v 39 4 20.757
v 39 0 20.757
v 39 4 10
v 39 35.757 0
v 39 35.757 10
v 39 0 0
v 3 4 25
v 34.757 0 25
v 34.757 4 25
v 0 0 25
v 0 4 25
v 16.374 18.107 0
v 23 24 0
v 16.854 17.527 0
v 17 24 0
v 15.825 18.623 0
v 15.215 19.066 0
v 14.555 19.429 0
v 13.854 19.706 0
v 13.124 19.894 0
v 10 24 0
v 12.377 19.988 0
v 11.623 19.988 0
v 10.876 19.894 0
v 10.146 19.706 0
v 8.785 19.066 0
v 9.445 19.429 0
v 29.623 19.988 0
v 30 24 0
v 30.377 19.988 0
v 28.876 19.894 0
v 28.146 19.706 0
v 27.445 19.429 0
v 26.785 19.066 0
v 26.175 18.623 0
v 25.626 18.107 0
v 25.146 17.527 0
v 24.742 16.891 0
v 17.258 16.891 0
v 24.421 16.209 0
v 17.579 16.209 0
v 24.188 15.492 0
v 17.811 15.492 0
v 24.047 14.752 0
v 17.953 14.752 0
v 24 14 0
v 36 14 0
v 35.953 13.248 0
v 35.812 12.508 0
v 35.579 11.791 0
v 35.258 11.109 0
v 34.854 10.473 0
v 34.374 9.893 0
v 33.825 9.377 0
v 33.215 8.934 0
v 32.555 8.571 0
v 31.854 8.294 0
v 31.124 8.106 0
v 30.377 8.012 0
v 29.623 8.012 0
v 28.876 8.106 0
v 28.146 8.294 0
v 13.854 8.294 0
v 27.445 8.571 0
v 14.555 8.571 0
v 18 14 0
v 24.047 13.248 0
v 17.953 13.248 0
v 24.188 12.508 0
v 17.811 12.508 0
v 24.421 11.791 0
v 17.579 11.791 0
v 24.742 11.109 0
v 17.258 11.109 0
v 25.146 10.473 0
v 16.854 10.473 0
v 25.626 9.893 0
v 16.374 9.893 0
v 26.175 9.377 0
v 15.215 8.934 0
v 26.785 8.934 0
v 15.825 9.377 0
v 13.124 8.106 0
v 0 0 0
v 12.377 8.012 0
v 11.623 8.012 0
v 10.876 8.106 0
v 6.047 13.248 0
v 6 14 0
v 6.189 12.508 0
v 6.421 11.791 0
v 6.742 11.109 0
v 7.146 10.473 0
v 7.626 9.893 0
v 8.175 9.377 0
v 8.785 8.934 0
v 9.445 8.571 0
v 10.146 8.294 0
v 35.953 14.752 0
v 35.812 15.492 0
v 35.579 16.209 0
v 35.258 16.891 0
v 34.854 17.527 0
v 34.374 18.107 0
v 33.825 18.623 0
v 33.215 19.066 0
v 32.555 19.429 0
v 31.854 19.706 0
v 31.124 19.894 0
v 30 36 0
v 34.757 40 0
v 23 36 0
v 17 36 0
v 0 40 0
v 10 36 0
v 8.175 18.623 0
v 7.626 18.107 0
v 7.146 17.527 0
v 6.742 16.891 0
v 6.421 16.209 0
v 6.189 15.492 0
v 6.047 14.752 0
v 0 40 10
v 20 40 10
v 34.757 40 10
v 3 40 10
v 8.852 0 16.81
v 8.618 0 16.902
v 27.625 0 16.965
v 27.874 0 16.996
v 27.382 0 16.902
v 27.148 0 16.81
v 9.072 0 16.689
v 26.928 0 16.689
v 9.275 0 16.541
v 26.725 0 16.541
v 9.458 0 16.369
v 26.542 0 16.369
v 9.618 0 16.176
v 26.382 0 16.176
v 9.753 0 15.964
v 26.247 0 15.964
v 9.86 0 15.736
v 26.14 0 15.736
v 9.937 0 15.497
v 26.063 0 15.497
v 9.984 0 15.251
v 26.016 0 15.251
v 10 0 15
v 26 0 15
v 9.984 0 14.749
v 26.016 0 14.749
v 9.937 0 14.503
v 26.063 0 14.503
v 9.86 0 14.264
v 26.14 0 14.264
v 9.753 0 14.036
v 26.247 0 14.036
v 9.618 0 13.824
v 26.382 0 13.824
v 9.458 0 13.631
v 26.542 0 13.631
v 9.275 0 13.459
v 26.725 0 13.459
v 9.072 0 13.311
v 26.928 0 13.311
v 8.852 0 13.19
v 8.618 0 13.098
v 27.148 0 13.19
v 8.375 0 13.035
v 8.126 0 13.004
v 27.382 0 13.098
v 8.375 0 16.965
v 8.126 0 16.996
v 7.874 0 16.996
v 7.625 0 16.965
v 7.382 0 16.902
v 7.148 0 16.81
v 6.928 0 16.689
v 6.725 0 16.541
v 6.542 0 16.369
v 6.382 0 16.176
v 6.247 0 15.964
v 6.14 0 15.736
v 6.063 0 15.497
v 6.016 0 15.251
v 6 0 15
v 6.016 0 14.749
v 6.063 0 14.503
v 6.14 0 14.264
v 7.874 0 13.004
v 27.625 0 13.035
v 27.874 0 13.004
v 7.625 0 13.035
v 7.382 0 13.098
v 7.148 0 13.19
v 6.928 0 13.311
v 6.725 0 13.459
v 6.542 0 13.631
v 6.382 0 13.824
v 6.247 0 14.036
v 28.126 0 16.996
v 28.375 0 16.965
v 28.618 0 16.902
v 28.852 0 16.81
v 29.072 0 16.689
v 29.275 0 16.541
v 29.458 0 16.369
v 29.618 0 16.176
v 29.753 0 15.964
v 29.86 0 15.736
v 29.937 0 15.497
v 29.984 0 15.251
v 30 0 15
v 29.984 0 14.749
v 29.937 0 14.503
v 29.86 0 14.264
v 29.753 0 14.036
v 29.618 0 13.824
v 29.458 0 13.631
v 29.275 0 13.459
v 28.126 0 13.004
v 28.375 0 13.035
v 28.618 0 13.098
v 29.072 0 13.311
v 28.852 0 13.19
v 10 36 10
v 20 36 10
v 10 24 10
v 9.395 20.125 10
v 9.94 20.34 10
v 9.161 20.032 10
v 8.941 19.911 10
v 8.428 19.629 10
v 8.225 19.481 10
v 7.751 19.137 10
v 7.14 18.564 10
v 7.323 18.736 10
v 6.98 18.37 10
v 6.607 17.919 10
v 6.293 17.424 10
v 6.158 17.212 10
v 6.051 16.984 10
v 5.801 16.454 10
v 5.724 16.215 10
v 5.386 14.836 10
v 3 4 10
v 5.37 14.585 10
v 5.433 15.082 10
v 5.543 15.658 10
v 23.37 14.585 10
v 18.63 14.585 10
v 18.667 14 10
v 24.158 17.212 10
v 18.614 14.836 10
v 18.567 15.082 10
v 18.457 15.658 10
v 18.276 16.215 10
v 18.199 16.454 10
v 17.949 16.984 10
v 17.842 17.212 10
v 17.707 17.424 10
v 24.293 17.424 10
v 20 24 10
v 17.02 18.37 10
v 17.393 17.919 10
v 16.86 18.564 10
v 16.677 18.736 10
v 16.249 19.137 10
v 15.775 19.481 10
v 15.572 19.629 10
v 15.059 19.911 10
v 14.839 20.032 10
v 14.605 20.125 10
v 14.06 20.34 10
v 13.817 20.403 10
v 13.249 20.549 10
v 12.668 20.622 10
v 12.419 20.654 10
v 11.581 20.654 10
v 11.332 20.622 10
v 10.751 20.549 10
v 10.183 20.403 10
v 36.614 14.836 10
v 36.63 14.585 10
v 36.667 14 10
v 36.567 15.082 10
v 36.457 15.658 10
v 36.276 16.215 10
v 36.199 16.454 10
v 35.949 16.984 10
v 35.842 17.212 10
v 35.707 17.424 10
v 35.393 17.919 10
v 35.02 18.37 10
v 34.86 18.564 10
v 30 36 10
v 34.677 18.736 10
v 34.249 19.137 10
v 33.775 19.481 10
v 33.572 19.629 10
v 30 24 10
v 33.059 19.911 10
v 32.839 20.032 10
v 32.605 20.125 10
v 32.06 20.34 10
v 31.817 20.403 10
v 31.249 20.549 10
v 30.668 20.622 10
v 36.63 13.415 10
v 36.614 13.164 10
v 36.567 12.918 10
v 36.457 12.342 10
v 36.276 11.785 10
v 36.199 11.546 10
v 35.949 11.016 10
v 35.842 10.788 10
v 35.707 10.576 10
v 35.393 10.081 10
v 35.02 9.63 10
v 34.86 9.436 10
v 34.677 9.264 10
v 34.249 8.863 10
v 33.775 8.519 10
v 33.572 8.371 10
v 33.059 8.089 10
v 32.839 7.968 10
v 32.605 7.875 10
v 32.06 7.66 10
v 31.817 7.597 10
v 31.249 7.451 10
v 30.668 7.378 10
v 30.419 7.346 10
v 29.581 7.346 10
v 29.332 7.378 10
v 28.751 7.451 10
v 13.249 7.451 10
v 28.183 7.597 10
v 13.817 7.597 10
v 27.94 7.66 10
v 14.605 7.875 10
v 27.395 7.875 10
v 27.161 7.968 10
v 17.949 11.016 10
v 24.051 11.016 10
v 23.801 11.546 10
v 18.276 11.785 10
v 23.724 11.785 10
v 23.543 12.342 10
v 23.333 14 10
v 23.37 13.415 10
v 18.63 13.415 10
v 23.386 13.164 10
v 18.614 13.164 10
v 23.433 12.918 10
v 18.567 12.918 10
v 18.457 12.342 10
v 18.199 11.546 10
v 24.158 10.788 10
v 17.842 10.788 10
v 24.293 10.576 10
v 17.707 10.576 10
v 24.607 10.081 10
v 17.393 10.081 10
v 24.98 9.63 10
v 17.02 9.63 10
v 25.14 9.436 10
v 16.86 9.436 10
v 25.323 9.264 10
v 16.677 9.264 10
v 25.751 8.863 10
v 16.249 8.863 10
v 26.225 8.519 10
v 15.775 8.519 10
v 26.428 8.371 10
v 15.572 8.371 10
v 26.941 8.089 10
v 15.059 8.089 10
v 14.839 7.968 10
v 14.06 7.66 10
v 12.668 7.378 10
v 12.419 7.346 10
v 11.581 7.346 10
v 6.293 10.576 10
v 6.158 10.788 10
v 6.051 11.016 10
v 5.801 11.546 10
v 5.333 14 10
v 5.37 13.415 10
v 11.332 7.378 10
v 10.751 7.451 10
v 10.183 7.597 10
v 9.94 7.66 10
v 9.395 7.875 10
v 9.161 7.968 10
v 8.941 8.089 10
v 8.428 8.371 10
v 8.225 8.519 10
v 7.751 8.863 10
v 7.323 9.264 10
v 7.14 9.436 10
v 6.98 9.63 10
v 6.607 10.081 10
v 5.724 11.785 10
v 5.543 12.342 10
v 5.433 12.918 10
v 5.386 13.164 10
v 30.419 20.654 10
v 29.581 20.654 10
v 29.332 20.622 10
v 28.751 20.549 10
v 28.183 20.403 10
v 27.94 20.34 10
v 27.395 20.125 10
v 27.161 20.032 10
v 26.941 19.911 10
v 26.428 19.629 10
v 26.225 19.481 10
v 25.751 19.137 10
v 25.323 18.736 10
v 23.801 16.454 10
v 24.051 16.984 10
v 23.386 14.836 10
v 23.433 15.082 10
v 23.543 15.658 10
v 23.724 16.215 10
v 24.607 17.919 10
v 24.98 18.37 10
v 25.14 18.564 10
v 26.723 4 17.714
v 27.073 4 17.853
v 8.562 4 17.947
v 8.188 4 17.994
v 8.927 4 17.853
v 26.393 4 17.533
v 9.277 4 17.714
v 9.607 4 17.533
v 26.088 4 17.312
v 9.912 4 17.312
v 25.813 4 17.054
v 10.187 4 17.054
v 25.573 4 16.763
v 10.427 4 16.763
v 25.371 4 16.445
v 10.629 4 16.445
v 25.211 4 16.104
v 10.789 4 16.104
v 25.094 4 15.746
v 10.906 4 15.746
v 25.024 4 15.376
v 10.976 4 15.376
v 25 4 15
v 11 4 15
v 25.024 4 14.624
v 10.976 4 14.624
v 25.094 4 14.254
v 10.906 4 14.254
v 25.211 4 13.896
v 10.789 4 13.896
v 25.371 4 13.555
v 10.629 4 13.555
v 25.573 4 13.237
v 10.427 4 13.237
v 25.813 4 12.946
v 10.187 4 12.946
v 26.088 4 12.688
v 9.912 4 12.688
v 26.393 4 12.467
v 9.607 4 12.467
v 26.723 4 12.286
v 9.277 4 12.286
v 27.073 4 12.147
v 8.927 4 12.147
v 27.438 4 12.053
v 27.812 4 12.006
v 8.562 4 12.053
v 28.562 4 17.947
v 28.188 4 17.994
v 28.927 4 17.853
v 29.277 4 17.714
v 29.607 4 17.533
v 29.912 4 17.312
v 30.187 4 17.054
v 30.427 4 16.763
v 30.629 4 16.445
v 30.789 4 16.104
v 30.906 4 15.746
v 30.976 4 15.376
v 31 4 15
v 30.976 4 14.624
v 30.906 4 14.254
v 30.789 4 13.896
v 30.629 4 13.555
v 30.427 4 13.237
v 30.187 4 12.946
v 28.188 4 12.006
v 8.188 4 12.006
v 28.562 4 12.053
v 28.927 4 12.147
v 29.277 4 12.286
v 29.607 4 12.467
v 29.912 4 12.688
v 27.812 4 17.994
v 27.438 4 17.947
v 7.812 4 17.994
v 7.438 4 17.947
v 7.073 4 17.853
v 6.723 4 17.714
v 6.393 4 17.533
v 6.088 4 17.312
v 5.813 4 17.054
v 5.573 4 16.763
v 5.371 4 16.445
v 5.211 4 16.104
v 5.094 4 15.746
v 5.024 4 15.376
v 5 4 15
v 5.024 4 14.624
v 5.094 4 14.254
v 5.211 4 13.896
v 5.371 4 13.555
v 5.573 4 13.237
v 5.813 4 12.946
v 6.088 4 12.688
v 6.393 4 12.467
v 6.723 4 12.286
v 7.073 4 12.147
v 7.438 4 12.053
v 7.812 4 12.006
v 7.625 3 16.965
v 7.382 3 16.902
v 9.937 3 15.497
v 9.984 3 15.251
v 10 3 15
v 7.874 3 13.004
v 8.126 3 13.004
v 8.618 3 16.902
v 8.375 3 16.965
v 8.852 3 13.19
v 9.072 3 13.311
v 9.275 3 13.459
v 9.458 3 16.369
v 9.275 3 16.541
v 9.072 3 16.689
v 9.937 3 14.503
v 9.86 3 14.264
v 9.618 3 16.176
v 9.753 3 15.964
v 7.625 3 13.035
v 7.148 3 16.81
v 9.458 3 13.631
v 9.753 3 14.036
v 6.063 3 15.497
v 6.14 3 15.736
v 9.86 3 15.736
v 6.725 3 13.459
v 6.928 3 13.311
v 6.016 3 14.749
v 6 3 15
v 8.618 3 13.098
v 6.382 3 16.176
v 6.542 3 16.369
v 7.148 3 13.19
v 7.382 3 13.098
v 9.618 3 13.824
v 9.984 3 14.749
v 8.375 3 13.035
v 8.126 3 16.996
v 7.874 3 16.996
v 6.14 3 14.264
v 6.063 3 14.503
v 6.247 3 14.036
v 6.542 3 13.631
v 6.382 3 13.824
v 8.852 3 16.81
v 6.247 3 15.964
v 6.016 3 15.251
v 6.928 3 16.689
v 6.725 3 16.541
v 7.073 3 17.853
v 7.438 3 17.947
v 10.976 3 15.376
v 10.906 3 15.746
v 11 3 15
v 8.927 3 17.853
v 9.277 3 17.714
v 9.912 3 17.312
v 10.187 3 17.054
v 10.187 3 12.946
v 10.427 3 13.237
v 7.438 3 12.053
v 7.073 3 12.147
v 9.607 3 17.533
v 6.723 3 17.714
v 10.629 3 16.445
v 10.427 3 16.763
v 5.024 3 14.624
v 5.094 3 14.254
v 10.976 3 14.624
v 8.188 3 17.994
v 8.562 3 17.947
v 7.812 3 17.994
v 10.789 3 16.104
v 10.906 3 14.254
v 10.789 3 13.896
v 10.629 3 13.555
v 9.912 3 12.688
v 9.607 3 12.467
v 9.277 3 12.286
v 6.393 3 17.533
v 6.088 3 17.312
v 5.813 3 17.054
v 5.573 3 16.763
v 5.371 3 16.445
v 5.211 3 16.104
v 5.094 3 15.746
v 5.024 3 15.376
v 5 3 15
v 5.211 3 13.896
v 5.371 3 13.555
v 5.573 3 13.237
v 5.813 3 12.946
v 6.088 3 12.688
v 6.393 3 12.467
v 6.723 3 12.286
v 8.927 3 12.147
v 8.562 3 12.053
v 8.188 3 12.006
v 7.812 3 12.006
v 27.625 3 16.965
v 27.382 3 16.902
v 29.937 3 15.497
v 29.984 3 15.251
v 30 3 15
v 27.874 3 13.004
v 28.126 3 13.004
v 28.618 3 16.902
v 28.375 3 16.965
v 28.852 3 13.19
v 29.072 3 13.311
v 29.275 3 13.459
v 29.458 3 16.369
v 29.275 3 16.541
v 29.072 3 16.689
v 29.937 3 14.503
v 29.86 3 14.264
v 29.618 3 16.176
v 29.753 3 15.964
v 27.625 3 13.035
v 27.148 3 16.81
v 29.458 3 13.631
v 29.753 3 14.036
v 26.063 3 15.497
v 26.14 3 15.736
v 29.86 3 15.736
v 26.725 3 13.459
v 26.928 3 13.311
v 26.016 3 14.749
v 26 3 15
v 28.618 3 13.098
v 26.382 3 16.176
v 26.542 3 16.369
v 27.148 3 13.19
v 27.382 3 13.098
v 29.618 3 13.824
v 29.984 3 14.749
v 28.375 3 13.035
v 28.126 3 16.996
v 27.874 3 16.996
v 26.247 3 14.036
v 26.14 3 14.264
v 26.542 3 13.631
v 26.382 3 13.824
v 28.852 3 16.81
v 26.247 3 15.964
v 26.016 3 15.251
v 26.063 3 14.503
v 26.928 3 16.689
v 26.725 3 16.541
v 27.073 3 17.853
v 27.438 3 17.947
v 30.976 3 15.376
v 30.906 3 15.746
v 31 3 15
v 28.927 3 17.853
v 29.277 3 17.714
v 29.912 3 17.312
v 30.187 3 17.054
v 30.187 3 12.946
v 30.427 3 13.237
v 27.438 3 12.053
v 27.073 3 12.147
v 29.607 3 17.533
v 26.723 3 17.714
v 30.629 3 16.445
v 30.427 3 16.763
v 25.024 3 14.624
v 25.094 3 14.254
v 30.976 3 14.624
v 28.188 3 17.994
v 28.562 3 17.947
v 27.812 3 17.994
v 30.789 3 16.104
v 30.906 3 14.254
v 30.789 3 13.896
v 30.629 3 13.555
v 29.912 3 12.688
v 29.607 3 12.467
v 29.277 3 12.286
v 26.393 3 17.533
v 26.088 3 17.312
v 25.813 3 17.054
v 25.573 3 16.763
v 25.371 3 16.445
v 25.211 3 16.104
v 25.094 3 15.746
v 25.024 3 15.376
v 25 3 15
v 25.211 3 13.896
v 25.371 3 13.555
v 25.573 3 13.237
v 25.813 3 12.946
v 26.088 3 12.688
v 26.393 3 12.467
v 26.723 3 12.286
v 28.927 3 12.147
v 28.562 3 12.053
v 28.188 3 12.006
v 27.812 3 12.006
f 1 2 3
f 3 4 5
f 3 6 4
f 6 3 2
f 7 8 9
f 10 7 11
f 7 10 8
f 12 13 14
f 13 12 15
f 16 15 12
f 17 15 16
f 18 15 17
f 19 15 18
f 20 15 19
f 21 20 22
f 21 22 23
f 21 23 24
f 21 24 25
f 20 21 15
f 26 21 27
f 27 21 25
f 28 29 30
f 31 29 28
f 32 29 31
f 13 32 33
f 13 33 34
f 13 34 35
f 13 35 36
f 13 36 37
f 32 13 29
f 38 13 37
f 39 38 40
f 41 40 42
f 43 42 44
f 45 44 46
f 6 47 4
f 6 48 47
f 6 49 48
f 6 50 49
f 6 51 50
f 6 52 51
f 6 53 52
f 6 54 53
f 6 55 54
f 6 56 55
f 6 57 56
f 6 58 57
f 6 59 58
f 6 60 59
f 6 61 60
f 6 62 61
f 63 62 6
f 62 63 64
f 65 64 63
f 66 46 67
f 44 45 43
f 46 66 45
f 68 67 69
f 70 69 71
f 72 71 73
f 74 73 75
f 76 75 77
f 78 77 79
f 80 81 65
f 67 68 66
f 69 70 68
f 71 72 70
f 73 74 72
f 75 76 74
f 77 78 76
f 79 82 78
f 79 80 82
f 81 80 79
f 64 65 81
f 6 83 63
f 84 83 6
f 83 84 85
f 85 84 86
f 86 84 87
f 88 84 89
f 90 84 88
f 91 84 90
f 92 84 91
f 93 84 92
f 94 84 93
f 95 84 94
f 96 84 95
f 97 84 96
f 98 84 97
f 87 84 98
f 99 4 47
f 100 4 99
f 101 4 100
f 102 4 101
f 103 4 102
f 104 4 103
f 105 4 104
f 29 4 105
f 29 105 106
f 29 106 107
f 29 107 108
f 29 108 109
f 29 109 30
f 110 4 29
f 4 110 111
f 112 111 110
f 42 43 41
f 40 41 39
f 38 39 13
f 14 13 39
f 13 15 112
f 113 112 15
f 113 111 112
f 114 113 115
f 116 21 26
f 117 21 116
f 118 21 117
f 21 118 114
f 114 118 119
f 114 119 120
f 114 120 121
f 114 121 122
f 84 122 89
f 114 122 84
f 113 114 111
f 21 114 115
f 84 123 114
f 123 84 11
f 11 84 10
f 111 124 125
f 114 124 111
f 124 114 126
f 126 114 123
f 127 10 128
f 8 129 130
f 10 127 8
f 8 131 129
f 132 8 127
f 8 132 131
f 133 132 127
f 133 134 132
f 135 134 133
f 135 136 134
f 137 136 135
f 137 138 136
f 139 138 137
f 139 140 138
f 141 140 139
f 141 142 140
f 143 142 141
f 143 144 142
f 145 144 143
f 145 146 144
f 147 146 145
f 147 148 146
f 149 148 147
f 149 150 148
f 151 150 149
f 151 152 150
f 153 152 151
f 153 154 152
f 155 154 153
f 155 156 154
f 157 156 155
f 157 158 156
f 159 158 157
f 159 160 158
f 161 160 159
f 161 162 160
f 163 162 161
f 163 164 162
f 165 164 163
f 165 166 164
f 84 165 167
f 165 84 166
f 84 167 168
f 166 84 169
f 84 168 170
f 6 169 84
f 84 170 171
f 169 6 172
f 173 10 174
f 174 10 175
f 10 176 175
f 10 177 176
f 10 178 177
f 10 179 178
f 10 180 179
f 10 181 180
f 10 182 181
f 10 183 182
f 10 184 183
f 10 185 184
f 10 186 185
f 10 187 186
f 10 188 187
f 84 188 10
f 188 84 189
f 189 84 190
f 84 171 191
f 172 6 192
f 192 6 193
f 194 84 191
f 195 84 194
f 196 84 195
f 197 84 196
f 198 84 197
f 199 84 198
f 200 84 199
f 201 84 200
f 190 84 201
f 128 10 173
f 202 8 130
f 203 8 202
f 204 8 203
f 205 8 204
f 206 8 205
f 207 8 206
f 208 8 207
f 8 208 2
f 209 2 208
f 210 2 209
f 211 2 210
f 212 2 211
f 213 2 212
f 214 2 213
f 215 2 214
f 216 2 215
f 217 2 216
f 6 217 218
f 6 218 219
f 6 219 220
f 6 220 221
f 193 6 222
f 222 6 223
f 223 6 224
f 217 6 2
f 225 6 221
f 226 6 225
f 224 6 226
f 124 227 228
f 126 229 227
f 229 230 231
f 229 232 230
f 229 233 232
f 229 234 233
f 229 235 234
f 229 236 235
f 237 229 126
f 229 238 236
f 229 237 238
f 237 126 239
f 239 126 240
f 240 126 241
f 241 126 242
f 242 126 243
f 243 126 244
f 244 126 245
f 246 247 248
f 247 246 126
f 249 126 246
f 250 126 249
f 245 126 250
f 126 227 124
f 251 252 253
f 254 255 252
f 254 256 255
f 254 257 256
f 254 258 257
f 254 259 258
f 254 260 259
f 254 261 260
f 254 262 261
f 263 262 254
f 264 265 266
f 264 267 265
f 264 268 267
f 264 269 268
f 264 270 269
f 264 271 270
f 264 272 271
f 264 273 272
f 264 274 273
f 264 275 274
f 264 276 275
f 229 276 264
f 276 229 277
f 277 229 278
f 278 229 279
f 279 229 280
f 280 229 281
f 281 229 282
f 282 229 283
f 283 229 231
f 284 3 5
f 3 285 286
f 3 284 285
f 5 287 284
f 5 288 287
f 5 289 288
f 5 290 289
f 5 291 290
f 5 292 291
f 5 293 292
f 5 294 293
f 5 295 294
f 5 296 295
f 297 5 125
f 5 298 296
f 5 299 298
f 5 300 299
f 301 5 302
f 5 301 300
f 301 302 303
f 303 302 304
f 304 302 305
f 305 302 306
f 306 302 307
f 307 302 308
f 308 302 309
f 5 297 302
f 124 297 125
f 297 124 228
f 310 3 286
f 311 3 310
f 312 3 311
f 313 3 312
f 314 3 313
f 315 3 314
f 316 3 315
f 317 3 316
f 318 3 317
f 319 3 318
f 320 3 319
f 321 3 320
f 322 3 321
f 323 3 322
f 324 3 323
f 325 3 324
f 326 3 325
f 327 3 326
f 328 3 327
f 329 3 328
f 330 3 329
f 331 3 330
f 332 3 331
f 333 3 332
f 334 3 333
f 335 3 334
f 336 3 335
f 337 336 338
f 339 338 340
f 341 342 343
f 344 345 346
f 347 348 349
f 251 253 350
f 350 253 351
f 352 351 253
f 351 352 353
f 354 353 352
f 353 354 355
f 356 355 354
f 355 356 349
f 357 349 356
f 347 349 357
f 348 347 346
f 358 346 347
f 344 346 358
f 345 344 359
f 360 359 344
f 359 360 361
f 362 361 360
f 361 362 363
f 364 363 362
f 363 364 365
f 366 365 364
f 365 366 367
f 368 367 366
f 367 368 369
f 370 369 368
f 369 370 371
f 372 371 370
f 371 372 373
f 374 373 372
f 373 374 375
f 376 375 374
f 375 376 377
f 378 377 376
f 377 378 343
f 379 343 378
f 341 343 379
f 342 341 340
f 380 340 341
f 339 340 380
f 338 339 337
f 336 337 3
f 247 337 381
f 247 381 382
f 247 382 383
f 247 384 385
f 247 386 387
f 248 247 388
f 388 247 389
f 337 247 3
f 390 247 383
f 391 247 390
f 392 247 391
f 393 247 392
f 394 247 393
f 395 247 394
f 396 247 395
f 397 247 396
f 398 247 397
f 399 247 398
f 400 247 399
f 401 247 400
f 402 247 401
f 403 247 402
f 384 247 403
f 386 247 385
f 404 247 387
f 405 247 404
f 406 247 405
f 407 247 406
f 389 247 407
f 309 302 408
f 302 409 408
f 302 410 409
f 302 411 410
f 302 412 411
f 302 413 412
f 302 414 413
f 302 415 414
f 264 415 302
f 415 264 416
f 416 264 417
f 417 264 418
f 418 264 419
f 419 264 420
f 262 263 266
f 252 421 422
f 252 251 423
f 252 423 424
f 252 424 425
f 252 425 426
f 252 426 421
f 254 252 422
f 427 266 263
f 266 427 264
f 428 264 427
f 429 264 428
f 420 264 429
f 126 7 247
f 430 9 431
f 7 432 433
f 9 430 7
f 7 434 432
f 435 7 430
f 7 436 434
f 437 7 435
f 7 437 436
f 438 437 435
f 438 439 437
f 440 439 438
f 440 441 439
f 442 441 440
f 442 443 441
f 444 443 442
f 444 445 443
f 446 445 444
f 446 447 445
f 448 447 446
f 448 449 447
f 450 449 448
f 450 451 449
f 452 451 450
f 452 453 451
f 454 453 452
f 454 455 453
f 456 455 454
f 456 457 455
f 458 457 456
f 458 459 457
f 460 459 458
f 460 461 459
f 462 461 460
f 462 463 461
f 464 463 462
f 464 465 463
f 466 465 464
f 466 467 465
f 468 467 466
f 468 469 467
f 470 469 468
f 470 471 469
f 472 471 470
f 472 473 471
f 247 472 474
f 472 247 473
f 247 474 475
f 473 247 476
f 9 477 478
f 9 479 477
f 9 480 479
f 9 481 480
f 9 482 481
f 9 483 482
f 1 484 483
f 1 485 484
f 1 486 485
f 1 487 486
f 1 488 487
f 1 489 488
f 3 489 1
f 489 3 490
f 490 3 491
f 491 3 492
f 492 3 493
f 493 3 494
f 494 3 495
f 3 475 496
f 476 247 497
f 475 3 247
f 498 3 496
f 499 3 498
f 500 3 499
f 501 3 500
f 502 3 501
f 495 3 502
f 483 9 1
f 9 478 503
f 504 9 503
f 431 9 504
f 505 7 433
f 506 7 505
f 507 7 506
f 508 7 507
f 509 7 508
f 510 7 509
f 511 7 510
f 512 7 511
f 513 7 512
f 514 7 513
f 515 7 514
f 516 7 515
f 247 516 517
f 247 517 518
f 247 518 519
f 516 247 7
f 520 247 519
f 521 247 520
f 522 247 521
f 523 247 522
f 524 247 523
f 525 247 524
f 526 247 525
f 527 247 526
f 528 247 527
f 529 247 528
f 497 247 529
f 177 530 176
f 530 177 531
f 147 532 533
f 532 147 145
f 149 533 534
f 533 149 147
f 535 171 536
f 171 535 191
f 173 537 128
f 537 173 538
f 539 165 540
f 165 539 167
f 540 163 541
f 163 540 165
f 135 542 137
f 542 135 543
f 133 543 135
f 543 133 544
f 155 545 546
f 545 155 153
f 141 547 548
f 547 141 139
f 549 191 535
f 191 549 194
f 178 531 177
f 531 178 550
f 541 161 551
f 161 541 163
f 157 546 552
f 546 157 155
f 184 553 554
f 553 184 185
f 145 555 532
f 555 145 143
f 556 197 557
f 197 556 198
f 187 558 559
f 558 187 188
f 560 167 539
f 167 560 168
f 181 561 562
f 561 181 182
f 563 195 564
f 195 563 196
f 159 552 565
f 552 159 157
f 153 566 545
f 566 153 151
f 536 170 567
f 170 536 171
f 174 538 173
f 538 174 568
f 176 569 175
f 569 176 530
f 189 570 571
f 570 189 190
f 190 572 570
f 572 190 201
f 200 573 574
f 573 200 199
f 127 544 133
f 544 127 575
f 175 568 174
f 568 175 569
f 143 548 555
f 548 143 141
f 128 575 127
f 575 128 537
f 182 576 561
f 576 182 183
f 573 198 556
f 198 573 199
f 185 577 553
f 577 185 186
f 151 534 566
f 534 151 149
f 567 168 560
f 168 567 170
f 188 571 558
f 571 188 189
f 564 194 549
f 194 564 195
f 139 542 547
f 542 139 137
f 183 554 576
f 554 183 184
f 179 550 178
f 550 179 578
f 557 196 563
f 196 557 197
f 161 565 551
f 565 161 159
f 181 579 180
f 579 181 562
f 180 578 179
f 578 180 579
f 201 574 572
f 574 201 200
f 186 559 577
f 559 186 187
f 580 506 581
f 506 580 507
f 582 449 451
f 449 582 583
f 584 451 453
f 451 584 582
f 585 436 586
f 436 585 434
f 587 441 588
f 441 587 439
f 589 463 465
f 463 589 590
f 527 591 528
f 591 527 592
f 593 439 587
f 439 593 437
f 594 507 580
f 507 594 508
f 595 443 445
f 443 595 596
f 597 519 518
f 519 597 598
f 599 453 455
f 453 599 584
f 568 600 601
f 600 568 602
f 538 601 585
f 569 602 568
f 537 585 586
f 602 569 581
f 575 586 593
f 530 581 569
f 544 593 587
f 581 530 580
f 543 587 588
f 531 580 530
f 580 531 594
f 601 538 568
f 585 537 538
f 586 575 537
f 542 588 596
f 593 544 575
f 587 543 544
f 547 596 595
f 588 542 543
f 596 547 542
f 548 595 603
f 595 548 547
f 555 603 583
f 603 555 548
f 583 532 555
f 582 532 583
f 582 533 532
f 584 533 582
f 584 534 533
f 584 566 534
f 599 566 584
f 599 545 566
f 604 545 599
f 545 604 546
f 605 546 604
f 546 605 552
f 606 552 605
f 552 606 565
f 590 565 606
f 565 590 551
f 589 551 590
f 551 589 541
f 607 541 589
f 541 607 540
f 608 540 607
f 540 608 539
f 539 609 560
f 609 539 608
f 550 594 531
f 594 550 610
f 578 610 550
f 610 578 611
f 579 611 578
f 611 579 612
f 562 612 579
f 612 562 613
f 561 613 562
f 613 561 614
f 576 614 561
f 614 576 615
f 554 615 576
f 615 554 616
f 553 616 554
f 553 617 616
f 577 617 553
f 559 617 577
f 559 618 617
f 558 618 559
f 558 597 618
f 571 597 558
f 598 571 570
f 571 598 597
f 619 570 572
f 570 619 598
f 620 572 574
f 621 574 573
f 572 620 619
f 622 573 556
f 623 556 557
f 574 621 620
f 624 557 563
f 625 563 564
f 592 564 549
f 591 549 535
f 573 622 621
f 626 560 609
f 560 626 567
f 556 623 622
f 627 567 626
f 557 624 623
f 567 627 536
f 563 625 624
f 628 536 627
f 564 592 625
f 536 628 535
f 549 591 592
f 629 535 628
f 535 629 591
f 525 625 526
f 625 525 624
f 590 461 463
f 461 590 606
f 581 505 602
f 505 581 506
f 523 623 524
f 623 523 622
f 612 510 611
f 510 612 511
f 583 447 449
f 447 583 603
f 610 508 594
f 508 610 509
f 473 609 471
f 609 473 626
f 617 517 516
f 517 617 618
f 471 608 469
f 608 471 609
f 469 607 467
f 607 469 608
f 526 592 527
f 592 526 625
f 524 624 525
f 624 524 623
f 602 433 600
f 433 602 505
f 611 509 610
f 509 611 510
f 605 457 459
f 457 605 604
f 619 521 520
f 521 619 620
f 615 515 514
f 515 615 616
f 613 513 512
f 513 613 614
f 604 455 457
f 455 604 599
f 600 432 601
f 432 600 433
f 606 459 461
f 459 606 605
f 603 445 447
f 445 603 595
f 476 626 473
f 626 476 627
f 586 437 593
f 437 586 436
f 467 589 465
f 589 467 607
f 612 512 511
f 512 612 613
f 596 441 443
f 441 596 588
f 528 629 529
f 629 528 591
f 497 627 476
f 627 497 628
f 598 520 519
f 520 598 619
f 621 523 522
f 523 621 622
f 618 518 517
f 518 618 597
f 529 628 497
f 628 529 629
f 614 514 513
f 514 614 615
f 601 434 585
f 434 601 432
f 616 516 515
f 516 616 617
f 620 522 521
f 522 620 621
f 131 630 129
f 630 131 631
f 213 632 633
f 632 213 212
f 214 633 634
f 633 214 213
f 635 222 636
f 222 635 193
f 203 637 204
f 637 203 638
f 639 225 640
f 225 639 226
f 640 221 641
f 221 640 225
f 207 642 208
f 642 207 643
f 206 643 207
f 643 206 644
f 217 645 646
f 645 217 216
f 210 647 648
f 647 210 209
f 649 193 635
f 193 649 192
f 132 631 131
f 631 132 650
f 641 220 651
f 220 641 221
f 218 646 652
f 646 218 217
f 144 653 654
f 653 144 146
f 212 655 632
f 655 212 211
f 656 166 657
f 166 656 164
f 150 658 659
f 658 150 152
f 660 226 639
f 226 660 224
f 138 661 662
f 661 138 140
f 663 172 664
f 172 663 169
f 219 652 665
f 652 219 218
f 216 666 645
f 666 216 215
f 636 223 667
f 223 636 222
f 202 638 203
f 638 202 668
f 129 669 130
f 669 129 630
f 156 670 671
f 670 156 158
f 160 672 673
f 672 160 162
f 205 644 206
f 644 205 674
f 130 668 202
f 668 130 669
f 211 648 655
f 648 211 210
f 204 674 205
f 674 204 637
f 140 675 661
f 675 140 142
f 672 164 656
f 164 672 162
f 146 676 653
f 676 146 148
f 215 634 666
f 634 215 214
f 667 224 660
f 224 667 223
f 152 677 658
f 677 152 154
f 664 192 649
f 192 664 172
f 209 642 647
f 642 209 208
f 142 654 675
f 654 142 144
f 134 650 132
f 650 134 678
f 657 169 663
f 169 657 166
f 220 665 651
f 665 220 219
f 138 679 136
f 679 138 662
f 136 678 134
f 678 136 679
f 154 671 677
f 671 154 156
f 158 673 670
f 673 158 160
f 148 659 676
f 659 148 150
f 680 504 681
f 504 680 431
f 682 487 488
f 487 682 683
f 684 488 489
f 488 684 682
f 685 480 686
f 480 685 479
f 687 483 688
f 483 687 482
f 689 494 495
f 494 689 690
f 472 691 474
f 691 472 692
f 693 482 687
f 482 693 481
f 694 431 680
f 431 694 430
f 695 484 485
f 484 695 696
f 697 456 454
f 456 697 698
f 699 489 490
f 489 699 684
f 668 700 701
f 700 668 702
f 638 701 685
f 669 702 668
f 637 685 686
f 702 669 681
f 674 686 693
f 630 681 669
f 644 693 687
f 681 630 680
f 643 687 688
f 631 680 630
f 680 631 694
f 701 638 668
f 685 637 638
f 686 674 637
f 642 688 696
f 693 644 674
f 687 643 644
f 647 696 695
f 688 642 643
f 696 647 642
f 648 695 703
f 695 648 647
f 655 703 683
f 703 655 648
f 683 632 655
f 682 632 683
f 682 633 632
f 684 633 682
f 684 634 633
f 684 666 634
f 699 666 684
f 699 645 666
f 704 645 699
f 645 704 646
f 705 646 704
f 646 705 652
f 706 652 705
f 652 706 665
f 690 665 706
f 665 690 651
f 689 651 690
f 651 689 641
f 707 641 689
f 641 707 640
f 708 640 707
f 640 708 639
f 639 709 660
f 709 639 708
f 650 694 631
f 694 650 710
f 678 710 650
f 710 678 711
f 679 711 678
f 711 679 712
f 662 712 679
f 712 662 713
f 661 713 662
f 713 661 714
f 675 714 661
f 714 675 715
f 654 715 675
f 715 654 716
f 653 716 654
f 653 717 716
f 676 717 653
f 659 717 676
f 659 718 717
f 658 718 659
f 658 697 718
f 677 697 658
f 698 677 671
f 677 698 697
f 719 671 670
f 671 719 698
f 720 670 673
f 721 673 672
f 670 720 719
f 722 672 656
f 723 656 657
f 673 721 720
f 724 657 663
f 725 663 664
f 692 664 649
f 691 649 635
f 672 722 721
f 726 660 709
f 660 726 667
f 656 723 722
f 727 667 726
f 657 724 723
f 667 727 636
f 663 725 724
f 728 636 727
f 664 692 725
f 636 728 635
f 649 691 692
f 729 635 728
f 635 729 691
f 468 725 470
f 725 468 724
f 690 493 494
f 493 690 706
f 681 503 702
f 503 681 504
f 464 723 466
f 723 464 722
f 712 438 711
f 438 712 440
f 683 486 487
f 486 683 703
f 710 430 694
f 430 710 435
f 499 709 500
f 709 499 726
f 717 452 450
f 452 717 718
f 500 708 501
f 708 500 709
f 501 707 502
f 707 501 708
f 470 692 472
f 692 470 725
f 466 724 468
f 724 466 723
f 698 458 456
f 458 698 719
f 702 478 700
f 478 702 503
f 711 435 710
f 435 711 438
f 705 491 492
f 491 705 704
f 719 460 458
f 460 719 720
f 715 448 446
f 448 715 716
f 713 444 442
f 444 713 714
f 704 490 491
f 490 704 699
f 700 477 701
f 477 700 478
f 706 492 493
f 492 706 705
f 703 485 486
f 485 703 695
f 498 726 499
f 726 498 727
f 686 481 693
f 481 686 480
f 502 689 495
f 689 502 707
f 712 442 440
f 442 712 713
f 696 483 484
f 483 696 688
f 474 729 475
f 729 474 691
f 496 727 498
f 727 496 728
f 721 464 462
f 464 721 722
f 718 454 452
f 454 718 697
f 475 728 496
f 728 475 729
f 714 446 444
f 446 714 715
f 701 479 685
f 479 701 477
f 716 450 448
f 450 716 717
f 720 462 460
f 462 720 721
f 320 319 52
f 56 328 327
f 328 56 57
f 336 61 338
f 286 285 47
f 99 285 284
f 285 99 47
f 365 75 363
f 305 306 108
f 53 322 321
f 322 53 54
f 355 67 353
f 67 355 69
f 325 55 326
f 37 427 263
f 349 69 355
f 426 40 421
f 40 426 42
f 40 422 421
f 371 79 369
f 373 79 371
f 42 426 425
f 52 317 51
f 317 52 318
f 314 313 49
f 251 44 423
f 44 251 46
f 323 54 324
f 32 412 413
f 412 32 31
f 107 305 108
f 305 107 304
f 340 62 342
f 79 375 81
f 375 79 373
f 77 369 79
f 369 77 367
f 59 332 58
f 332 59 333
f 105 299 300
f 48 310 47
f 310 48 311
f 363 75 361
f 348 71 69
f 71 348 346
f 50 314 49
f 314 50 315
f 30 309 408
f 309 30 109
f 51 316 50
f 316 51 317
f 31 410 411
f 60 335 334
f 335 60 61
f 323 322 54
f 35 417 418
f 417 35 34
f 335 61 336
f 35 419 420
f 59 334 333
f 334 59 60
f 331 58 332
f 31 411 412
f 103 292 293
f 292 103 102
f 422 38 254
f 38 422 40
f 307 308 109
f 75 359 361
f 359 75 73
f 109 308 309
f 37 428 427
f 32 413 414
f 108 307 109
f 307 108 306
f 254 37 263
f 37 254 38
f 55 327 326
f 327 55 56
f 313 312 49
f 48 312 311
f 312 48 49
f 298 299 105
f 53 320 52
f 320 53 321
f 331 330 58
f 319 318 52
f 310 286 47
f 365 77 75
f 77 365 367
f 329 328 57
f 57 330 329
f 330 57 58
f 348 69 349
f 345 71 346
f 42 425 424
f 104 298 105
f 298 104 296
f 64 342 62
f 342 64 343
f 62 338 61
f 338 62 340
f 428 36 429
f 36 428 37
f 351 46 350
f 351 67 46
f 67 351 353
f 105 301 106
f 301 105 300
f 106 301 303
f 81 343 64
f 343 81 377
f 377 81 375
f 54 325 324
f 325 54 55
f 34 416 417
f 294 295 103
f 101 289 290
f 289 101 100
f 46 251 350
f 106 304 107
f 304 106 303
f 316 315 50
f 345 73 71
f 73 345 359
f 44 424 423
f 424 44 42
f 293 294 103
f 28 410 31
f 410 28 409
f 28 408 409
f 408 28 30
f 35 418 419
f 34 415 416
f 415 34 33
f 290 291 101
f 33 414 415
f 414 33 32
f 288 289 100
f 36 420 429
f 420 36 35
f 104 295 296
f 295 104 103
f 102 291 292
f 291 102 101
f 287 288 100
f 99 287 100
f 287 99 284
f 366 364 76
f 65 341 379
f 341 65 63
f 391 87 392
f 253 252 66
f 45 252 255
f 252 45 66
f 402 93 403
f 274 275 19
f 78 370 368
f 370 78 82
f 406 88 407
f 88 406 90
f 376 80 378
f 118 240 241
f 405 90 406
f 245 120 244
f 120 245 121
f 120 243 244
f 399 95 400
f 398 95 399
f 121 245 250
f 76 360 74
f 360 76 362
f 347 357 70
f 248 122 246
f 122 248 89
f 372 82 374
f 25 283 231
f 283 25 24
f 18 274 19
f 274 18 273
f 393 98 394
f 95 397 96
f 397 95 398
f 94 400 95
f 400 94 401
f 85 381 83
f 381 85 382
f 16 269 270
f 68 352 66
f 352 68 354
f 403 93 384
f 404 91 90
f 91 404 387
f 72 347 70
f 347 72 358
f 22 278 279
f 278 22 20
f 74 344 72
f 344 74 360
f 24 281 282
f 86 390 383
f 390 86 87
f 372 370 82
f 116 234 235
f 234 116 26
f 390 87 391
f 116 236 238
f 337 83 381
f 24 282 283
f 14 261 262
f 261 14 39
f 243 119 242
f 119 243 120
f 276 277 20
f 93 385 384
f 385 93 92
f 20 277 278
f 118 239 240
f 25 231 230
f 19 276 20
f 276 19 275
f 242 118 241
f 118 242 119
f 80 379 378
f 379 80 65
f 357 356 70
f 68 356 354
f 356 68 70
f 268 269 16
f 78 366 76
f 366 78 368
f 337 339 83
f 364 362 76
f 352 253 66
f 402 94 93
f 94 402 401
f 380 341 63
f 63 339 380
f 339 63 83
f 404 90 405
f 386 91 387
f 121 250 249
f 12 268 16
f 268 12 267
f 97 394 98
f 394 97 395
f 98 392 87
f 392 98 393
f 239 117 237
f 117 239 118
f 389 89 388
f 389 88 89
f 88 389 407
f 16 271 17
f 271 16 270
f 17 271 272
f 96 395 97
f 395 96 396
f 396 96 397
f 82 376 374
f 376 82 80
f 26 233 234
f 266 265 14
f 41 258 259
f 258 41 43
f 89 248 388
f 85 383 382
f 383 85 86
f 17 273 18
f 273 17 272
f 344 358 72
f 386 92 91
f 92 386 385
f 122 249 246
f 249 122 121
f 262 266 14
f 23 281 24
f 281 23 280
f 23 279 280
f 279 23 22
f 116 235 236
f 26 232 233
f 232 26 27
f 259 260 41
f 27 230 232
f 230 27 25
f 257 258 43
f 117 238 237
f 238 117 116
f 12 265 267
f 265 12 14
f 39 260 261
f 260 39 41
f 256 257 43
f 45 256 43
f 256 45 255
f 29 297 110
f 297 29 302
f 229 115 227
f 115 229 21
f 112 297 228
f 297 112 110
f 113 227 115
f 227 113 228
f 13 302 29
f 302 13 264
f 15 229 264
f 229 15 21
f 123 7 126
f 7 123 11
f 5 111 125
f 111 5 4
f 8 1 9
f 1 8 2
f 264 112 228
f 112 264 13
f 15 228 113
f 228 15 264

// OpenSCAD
$fn = 50;
difference() { 
cube (size = [39, 40, 25]);
translate ([3, 4, 10]) cube (size = [36, 40, 15]);


translate ([8, 5, 15]) rotate (a = [90, 0, 0]) cylinder (h = 6, r = 2);
translate ([8, 5, 15]) rotate (a = [90, 0, 0]) cylinder (h = 2, r = 3);
translate ([28, 5, 15]) rotate (a = [90, 0, 0]) cylinder (h = 6, r = 2);
translate ([28, 5, 15]) rotate (a = [90, 0, 0]) cylinder (h = 2, r = 3);


translate ([30, 14, 0]) cylinder (h = 15, r1 = 6, r2 = 7);
translate ([12, 14, 0]) cylinder (h = 15, r1 = 6, r2 = 7);


translate ([10, 24, 0]) cube (size = [20, 12, 15]);


rotate (a = [0, 90, 0]) 
linear_extrude(5,center = false,2,twist = 0,slices = 20){
		polygon([[-25,40],[-10,40],[-25,4]]);}
		

translate ([39, 40, 0]) rotate (a = [0, 0, 45]) cube (size = [6, 6, 25], center = true);
translate ([39, 0, 25]) rotate (a = [90, 45, 0]) cube (size = [6, 6, 10], center = true);
}

translate ([10, 40, 0]) rotate (a = [90, 0, 0]) 
linear_extrude(20,center = false,2,twist = 0,slices = 20){
		polygon([[10,10],[13,0],[7,0]]);}
